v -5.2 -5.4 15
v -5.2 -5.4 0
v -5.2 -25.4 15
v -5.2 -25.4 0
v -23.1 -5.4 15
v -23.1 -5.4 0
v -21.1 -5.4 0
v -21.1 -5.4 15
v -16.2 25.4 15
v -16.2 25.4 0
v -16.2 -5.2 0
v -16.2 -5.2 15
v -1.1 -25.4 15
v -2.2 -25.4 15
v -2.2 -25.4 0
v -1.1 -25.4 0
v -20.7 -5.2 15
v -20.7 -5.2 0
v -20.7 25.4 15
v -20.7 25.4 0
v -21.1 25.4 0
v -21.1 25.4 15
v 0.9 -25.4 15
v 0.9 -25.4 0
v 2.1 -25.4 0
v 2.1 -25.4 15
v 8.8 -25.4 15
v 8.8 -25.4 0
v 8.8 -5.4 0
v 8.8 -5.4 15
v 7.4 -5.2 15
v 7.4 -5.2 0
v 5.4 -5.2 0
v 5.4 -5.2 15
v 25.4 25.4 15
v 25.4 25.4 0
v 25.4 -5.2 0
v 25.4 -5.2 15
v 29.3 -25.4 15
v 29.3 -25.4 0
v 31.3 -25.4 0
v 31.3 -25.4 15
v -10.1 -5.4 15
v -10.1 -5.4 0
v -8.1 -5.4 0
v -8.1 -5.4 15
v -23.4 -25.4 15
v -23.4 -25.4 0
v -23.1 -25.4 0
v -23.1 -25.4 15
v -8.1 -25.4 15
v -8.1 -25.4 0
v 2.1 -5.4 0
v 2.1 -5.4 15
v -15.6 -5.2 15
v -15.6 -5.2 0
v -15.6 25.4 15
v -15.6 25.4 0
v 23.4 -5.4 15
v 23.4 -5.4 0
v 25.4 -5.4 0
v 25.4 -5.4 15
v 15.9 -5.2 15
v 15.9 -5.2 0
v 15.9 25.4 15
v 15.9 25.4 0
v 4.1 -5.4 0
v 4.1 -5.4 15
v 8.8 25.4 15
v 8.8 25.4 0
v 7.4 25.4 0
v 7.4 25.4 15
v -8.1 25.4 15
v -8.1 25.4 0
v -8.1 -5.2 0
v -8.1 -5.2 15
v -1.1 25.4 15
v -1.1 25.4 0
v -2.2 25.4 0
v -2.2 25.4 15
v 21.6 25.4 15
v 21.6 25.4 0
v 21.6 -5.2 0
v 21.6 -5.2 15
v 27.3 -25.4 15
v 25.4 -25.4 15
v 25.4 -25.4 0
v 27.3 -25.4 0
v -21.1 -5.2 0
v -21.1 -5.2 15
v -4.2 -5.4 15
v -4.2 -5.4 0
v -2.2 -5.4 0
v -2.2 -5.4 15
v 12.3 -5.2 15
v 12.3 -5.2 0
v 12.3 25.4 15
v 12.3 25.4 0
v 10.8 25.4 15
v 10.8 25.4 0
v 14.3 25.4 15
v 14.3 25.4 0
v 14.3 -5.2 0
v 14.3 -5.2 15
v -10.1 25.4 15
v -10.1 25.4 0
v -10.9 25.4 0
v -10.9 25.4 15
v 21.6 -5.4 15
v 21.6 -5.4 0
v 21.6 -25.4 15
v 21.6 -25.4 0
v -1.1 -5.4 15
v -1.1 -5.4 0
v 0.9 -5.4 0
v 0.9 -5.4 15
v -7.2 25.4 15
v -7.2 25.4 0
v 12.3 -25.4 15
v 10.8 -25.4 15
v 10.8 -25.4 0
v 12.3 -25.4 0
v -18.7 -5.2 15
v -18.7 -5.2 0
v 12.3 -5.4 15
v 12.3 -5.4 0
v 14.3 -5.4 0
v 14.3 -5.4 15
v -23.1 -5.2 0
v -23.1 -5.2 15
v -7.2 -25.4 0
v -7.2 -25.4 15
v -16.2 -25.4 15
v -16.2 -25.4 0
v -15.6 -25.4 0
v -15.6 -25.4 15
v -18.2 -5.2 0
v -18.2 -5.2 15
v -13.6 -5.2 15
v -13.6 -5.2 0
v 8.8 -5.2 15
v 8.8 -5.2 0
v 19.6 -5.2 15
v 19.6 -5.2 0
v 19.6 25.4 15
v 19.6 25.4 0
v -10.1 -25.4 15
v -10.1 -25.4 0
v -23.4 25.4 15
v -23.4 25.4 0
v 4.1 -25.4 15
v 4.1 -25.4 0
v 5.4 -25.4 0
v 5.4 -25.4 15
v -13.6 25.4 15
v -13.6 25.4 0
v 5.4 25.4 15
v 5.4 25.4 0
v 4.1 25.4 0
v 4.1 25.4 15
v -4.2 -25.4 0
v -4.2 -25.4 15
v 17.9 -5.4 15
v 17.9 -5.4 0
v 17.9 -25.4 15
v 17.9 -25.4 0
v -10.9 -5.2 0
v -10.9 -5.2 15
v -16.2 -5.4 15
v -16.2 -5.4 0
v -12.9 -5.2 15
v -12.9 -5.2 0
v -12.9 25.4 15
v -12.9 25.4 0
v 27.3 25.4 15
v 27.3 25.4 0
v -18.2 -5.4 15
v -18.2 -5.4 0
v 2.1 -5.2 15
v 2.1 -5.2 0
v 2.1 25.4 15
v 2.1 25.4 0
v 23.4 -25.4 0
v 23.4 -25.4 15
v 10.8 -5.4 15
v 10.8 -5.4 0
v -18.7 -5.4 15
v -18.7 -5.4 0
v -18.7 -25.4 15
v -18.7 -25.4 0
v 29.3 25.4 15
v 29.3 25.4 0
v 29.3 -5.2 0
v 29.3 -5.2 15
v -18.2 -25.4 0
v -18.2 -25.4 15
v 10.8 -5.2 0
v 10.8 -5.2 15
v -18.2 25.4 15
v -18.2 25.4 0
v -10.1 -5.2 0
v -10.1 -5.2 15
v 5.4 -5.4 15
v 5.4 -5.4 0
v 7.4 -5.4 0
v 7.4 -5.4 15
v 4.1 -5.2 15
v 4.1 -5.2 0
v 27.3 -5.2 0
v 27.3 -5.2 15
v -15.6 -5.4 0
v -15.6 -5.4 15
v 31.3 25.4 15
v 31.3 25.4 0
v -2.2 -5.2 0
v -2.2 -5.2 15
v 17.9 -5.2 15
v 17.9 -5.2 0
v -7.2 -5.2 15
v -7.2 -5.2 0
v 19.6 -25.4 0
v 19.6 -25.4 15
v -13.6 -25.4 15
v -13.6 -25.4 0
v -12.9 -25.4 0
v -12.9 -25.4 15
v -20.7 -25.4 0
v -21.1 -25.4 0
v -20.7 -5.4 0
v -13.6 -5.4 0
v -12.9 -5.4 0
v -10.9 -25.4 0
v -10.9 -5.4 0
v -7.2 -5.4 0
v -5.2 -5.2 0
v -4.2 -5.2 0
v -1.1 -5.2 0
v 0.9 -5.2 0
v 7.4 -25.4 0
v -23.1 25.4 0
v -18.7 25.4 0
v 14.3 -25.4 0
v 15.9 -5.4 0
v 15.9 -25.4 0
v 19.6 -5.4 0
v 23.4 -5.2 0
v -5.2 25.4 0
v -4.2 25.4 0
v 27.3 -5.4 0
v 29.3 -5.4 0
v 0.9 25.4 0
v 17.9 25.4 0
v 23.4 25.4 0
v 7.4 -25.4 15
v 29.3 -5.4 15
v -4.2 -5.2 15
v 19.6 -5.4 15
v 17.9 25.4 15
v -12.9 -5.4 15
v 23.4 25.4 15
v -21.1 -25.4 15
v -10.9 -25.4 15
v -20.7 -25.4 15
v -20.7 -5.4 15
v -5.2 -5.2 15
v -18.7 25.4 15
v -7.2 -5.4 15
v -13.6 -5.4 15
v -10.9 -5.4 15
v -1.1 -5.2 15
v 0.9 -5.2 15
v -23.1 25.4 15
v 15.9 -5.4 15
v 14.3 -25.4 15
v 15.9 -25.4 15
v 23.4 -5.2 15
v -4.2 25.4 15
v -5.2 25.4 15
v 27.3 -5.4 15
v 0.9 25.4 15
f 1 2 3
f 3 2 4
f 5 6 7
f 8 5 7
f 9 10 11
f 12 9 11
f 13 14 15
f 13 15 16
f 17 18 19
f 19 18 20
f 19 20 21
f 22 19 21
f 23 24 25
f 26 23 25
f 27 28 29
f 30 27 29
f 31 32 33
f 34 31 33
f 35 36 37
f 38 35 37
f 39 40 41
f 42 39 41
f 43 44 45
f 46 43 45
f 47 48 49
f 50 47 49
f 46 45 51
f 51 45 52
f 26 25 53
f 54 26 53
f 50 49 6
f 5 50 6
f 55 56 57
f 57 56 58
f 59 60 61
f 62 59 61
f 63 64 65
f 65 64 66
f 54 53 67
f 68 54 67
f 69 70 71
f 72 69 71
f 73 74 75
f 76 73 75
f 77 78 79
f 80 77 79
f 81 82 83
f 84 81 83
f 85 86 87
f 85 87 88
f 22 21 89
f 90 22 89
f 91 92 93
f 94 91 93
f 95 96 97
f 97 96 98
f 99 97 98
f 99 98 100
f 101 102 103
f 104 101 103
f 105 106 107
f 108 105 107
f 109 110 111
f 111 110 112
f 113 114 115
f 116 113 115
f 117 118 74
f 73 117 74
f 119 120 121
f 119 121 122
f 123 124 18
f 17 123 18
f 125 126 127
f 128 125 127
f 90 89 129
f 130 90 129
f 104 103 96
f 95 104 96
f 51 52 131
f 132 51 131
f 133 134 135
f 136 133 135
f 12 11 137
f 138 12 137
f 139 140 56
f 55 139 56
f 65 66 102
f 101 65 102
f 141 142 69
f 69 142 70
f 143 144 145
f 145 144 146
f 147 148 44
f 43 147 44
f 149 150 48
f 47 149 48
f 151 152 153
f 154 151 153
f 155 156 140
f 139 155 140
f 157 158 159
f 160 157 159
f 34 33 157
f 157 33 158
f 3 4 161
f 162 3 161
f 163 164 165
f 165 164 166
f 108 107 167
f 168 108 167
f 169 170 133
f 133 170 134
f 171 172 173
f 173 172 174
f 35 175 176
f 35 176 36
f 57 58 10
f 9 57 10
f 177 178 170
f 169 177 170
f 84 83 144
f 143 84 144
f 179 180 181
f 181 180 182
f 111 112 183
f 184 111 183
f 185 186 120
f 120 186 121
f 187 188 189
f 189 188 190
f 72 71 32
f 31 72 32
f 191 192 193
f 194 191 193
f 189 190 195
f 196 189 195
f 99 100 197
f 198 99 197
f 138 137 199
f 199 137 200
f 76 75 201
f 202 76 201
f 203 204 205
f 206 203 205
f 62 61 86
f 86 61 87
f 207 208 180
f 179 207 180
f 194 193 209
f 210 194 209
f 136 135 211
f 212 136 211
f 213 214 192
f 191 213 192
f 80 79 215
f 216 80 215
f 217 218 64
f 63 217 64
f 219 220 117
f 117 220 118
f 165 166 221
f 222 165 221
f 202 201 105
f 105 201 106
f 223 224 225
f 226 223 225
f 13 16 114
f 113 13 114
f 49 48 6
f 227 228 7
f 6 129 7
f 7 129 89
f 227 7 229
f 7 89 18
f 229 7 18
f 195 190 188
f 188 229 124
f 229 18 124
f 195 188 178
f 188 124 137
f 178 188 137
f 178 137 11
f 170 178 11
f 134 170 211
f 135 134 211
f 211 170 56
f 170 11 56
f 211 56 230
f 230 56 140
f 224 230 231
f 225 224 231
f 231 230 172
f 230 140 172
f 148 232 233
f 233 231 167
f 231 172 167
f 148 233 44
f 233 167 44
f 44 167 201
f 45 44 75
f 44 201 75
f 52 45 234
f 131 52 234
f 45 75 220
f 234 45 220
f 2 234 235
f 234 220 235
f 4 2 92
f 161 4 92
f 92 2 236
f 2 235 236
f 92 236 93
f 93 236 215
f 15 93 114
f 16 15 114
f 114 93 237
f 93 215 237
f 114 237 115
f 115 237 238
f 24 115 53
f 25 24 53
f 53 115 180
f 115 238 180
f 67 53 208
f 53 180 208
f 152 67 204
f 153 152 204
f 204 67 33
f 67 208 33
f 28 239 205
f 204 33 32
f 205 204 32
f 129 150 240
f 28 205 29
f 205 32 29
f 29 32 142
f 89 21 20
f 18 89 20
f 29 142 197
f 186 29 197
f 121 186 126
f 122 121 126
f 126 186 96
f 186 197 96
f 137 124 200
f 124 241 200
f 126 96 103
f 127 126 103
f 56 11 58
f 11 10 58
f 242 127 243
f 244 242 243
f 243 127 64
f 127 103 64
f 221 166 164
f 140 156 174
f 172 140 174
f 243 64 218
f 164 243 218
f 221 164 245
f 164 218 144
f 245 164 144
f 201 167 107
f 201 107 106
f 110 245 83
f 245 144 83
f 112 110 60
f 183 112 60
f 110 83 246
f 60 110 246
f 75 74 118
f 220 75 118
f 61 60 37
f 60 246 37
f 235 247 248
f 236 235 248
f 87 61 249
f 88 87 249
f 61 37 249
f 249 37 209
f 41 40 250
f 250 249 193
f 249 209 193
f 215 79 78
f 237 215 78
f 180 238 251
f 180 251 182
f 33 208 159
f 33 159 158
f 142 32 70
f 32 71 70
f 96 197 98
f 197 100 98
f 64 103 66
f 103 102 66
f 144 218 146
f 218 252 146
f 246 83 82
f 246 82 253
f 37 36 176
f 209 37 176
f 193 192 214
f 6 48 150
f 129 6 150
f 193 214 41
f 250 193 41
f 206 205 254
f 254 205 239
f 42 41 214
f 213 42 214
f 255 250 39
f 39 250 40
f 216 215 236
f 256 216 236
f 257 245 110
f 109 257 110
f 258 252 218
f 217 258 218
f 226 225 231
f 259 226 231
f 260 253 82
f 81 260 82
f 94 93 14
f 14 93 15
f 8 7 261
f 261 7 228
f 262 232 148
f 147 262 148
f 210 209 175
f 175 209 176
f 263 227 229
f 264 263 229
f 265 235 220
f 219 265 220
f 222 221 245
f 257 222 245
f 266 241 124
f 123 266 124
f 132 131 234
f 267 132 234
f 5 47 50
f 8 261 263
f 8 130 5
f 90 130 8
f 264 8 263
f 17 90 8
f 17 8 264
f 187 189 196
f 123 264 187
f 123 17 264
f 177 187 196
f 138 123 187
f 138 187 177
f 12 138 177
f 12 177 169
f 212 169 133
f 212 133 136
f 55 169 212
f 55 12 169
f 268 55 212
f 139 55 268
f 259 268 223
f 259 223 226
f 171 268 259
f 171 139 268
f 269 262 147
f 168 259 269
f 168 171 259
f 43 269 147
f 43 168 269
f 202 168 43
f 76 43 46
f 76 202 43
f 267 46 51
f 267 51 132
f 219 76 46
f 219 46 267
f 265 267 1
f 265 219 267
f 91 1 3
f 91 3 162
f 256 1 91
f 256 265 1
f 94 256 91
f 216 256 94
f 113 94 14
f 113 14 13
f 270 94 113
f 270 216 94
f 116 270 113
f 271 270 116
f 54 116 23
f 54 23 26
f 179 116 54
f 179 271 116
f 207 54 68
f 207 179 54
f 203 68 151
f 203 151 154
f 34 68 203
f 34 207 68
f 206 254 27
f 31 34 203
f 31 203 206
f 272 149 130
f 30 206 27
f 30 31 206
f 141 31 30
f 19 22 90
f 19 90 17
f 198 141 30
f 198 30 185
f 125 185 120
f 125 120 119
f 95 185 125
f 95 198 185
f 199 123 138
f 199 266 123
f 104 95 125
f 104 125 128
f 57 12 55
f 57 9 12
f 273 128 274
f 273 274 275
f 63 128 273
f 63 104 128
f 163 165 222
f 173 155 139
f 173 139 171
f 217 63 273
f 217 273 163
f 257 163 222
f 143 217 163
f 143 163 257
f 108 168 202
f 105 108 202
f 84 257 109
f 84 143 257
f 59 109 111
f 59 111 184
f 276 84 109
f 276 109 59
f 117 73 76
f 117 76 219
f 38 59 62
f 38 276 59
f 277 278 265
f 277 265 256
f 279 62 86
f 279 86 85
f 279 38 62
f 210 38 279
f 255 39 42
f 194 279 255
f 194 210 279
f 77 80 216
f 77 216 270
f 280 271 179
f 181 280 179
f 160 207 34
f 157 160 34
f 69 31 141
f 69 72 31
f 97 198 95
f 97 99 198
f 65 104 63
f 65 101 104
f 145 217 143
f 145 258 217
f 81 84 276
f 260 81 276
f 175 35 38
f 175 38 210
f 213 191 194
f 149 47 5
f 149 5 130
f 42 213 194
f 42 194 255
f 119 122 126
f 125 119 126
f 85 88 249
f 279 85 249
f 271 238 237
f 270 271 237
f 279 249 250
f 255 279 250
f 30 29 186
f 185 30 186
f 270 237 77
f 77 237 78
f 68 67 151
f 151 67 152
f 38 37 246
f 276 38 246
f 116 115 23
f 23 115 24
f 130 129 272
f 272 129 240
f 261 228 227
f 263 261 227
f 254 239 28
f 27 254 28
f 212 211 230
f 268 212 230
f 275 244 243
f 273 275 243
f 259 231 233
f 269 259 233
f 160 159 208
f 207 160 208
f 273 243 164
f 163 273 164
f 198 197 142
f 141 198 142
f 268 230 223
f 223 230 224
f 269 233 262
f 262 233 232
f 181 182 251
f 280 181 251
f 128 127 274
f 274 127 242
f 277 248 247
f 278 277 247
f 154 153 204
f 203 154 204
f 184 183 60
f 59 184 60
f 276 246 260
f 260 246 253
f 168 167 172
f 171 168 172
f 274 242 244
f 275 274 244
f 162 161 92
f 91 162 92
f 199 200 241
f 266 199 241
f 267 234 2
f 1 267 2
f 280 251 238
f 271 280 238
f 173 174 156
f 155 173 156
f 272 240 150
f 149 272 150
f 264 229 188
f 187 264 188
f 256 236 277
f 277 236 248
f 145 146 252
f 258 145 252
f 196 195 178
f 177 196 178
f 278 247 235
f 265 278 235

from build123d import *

# Parameters (mm, degrees)
F1_DEPTH = 15


with BuildPart() as f1:
    # F0 (on Top) → F1 (new body)
    with BuildSketch(Plane.XY):
        Polygon((-23.1, 25.4), (-23.4, 25.4), (-23.4, -25.4), (-23.1, -25.4), (-23.1, -5.4), (-21.1, -5.4), (-21.1, -25.4), (-20.7, -25.4), (-20.7, -5.4), (-18.7, -5.4), (-18.7, -25.4), (-18.2, -25.4), (-18.2, -5.4), (-16.2, -5.4), (-16.2, -25.4), (-15.6, -25.4), (-15.6, -5.4), (-13.6, -5.4), (-13.6, -25.4), (-12.9, -25.4), (-12.9, -5.4), (-10.9, -5.4), (-10.9, -25.4), (-10.1, -25.4), (-10.1, -5.4), (-8.1, -5.4), (-8.1, -25.4), (-7.2, -25.4), (-7.2, -5.4), (-5.2, -5.4), (-5.2, -25.4), (-4.2, -25.4), (-4.2, -5.4), (-2.2, -5.4), (-2.2, -25.4), (-1.1, -25.4), (-1.1, -5.4), (0.9, -5.4), (0.9, -25.4), (2.1, -25.4), (2.1, -5.4), (4.1, -5.4), (4.1, -25.4), (5.4, -25.4), (5.4, -5.4), (7.4, -5.4), (7.4, -25.4), (8.8, -25.4), (8.8, -5.4), (10.8, -5.4), (10.8, -25.4), (12.3, -25.4), (12.3, -5.4), (14.3, -5.4), (14.3, -25.4), (15.9, -25.4), (15.9, -5.4), (17.9, -5.4), (17.9, -25.4), (19.6, -25.4), (19.6, -5.4), (21.6, -5.4), (21.6, -25.4), (23.4, -25.4), (23.4, -5.4), (25.4, -5.4), (25.4, -25.4), (27.3, -25.4), (27.3, -5.4), (29.3, -5.4), (29.3, -25.4), (31.3, -25.4), (31.3, -5.4), (31.3, -5.2), (31.3, 25.4), (29.3, 25.4), (29.3, -5.2), (27.3, -5.2), (27.3, 25.4), (25.4, 25.4), (25.4, -5.2), (23.4, -5.2), (23.4, 25.4), (21.6, 25.4), (21.6, -5.2), (19.6, -5.2), (19.6, 25.4), (17.9, 25.4), (17.9, -5.2), (15.9, -5.2), (15.9, 25.4), (14.3, 25.4), (14.3, -5.2), (12.3, -5.2), (12.3, 25.4), (10.8, 25.4), (10.8, -5.2), (8.8, -5.2), (8.8, 25.4), (7.4, 25.4), (7.4, -5.2), (5.4, -5.2), (5.4, 25.4), (4.1, 25.4), (4.1, -5.2), (2.1, -5.2), (2.1, 25.4), (0.9, 25.4), (0.9, -5.2), (-1.1, -5.2), (-1.1, 25.4), (-2.2, 25.4), (-2.2, -5.2), (-4.2, -5.2), (-4.2, 25.4), (-5.2, 25.4), (-5.2, -5.2), (-7.2, -5.2), (-7.2, 25.4), (-8.1, 25.4), (-8.1, -5.2), (-10.1, -5.2), (-10.1, 25.4), (-10.9, 25.4), (-10.9, -5.2), (-12.9, -5.2), (-12.9, 25.4), (-13.6, 25.4), (-13.6, -5.2), (-15.6, -5.2), (-15.6, 25.4), (-16.2, 25.4), (-16.2, -5.2), (-18.2, -5.2), (-18.2, 25.4), (-18.7, 25.4), (-18.7, -5.2), (-20.7, -5.2), (-20.7, 25.4), (-21.1, 25.4), (-21.1, -5.2), (-23.1, -5.2), align=None)
    extrude(amount=F1_DEPTH)


solid = f1.part
